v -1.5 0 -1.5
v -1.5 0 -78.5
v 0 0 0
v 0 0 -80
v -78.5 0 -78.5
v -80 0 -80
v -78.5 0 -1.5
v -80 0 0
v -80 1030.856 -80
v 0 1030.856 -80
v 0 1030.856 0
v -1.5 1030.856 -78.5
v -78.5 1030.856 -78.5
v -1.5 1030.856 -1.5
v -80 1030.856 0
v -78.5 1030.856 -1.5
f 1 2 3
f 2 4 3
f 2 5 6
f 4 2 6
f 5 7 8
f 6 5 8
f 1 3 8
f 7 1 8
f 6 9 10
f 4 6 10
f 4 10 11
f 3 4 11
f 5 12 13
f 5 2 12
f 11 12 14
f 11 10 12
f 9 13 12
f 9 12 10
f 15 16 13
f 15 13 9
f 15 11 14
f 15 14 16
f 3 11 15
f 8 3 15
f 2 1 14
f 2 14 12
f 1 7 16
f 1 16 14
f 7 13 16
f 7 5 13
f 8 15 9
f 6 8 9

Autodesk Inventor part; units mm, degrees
ref_plane "YZ Plane" through (0, 0, 0) normal (1, 0, 0) x (0, 1, 0)
ref_plane "XZ Plane" through (0, 0, 0) normal (0, 1, 0) x (-1, 0, 0)
ref_plane "XY Plane" through (0, 0, 0) normal (0, 0, 1) x (1, 0, 0)
sketch "Boceto1" plane through (0, 0, 0) normal (0, 1, 0) x (-1, 0, 0)
  line L0 (0, 0) -> (80, 0)
  line L1 (80, 0) -> (80, -80)
  line L2 (80, -80) -> (0, -80)
  line L3 (0, -80) -> (0, 0)
  line L4 (1.5, -78.5) -> (78.5, -78.5)
  line L5 (78.5, -78.5) -> (78.5, -1.5)
  line L6 (78.5, -1.5) -> (1.5, -1.5)
  line L7 (1.5, -1.5) -> (1.5, -78.5)
  line L8 (1.5, -78.5) -> (78.5, -1.5) construction
  line L9 (78.5, -78.5) -> (1.5, -1.5) construction
  point P0 (40, -40)
  dimension "d0" = 80
  dimension "d1" = 80
  dimension "d2" = 77
  dimension "d3" = 77
extrude "Extrusión1" add sketch "Boceto1" along normal blind 1030.856
properties part number "Pata_mesa"
